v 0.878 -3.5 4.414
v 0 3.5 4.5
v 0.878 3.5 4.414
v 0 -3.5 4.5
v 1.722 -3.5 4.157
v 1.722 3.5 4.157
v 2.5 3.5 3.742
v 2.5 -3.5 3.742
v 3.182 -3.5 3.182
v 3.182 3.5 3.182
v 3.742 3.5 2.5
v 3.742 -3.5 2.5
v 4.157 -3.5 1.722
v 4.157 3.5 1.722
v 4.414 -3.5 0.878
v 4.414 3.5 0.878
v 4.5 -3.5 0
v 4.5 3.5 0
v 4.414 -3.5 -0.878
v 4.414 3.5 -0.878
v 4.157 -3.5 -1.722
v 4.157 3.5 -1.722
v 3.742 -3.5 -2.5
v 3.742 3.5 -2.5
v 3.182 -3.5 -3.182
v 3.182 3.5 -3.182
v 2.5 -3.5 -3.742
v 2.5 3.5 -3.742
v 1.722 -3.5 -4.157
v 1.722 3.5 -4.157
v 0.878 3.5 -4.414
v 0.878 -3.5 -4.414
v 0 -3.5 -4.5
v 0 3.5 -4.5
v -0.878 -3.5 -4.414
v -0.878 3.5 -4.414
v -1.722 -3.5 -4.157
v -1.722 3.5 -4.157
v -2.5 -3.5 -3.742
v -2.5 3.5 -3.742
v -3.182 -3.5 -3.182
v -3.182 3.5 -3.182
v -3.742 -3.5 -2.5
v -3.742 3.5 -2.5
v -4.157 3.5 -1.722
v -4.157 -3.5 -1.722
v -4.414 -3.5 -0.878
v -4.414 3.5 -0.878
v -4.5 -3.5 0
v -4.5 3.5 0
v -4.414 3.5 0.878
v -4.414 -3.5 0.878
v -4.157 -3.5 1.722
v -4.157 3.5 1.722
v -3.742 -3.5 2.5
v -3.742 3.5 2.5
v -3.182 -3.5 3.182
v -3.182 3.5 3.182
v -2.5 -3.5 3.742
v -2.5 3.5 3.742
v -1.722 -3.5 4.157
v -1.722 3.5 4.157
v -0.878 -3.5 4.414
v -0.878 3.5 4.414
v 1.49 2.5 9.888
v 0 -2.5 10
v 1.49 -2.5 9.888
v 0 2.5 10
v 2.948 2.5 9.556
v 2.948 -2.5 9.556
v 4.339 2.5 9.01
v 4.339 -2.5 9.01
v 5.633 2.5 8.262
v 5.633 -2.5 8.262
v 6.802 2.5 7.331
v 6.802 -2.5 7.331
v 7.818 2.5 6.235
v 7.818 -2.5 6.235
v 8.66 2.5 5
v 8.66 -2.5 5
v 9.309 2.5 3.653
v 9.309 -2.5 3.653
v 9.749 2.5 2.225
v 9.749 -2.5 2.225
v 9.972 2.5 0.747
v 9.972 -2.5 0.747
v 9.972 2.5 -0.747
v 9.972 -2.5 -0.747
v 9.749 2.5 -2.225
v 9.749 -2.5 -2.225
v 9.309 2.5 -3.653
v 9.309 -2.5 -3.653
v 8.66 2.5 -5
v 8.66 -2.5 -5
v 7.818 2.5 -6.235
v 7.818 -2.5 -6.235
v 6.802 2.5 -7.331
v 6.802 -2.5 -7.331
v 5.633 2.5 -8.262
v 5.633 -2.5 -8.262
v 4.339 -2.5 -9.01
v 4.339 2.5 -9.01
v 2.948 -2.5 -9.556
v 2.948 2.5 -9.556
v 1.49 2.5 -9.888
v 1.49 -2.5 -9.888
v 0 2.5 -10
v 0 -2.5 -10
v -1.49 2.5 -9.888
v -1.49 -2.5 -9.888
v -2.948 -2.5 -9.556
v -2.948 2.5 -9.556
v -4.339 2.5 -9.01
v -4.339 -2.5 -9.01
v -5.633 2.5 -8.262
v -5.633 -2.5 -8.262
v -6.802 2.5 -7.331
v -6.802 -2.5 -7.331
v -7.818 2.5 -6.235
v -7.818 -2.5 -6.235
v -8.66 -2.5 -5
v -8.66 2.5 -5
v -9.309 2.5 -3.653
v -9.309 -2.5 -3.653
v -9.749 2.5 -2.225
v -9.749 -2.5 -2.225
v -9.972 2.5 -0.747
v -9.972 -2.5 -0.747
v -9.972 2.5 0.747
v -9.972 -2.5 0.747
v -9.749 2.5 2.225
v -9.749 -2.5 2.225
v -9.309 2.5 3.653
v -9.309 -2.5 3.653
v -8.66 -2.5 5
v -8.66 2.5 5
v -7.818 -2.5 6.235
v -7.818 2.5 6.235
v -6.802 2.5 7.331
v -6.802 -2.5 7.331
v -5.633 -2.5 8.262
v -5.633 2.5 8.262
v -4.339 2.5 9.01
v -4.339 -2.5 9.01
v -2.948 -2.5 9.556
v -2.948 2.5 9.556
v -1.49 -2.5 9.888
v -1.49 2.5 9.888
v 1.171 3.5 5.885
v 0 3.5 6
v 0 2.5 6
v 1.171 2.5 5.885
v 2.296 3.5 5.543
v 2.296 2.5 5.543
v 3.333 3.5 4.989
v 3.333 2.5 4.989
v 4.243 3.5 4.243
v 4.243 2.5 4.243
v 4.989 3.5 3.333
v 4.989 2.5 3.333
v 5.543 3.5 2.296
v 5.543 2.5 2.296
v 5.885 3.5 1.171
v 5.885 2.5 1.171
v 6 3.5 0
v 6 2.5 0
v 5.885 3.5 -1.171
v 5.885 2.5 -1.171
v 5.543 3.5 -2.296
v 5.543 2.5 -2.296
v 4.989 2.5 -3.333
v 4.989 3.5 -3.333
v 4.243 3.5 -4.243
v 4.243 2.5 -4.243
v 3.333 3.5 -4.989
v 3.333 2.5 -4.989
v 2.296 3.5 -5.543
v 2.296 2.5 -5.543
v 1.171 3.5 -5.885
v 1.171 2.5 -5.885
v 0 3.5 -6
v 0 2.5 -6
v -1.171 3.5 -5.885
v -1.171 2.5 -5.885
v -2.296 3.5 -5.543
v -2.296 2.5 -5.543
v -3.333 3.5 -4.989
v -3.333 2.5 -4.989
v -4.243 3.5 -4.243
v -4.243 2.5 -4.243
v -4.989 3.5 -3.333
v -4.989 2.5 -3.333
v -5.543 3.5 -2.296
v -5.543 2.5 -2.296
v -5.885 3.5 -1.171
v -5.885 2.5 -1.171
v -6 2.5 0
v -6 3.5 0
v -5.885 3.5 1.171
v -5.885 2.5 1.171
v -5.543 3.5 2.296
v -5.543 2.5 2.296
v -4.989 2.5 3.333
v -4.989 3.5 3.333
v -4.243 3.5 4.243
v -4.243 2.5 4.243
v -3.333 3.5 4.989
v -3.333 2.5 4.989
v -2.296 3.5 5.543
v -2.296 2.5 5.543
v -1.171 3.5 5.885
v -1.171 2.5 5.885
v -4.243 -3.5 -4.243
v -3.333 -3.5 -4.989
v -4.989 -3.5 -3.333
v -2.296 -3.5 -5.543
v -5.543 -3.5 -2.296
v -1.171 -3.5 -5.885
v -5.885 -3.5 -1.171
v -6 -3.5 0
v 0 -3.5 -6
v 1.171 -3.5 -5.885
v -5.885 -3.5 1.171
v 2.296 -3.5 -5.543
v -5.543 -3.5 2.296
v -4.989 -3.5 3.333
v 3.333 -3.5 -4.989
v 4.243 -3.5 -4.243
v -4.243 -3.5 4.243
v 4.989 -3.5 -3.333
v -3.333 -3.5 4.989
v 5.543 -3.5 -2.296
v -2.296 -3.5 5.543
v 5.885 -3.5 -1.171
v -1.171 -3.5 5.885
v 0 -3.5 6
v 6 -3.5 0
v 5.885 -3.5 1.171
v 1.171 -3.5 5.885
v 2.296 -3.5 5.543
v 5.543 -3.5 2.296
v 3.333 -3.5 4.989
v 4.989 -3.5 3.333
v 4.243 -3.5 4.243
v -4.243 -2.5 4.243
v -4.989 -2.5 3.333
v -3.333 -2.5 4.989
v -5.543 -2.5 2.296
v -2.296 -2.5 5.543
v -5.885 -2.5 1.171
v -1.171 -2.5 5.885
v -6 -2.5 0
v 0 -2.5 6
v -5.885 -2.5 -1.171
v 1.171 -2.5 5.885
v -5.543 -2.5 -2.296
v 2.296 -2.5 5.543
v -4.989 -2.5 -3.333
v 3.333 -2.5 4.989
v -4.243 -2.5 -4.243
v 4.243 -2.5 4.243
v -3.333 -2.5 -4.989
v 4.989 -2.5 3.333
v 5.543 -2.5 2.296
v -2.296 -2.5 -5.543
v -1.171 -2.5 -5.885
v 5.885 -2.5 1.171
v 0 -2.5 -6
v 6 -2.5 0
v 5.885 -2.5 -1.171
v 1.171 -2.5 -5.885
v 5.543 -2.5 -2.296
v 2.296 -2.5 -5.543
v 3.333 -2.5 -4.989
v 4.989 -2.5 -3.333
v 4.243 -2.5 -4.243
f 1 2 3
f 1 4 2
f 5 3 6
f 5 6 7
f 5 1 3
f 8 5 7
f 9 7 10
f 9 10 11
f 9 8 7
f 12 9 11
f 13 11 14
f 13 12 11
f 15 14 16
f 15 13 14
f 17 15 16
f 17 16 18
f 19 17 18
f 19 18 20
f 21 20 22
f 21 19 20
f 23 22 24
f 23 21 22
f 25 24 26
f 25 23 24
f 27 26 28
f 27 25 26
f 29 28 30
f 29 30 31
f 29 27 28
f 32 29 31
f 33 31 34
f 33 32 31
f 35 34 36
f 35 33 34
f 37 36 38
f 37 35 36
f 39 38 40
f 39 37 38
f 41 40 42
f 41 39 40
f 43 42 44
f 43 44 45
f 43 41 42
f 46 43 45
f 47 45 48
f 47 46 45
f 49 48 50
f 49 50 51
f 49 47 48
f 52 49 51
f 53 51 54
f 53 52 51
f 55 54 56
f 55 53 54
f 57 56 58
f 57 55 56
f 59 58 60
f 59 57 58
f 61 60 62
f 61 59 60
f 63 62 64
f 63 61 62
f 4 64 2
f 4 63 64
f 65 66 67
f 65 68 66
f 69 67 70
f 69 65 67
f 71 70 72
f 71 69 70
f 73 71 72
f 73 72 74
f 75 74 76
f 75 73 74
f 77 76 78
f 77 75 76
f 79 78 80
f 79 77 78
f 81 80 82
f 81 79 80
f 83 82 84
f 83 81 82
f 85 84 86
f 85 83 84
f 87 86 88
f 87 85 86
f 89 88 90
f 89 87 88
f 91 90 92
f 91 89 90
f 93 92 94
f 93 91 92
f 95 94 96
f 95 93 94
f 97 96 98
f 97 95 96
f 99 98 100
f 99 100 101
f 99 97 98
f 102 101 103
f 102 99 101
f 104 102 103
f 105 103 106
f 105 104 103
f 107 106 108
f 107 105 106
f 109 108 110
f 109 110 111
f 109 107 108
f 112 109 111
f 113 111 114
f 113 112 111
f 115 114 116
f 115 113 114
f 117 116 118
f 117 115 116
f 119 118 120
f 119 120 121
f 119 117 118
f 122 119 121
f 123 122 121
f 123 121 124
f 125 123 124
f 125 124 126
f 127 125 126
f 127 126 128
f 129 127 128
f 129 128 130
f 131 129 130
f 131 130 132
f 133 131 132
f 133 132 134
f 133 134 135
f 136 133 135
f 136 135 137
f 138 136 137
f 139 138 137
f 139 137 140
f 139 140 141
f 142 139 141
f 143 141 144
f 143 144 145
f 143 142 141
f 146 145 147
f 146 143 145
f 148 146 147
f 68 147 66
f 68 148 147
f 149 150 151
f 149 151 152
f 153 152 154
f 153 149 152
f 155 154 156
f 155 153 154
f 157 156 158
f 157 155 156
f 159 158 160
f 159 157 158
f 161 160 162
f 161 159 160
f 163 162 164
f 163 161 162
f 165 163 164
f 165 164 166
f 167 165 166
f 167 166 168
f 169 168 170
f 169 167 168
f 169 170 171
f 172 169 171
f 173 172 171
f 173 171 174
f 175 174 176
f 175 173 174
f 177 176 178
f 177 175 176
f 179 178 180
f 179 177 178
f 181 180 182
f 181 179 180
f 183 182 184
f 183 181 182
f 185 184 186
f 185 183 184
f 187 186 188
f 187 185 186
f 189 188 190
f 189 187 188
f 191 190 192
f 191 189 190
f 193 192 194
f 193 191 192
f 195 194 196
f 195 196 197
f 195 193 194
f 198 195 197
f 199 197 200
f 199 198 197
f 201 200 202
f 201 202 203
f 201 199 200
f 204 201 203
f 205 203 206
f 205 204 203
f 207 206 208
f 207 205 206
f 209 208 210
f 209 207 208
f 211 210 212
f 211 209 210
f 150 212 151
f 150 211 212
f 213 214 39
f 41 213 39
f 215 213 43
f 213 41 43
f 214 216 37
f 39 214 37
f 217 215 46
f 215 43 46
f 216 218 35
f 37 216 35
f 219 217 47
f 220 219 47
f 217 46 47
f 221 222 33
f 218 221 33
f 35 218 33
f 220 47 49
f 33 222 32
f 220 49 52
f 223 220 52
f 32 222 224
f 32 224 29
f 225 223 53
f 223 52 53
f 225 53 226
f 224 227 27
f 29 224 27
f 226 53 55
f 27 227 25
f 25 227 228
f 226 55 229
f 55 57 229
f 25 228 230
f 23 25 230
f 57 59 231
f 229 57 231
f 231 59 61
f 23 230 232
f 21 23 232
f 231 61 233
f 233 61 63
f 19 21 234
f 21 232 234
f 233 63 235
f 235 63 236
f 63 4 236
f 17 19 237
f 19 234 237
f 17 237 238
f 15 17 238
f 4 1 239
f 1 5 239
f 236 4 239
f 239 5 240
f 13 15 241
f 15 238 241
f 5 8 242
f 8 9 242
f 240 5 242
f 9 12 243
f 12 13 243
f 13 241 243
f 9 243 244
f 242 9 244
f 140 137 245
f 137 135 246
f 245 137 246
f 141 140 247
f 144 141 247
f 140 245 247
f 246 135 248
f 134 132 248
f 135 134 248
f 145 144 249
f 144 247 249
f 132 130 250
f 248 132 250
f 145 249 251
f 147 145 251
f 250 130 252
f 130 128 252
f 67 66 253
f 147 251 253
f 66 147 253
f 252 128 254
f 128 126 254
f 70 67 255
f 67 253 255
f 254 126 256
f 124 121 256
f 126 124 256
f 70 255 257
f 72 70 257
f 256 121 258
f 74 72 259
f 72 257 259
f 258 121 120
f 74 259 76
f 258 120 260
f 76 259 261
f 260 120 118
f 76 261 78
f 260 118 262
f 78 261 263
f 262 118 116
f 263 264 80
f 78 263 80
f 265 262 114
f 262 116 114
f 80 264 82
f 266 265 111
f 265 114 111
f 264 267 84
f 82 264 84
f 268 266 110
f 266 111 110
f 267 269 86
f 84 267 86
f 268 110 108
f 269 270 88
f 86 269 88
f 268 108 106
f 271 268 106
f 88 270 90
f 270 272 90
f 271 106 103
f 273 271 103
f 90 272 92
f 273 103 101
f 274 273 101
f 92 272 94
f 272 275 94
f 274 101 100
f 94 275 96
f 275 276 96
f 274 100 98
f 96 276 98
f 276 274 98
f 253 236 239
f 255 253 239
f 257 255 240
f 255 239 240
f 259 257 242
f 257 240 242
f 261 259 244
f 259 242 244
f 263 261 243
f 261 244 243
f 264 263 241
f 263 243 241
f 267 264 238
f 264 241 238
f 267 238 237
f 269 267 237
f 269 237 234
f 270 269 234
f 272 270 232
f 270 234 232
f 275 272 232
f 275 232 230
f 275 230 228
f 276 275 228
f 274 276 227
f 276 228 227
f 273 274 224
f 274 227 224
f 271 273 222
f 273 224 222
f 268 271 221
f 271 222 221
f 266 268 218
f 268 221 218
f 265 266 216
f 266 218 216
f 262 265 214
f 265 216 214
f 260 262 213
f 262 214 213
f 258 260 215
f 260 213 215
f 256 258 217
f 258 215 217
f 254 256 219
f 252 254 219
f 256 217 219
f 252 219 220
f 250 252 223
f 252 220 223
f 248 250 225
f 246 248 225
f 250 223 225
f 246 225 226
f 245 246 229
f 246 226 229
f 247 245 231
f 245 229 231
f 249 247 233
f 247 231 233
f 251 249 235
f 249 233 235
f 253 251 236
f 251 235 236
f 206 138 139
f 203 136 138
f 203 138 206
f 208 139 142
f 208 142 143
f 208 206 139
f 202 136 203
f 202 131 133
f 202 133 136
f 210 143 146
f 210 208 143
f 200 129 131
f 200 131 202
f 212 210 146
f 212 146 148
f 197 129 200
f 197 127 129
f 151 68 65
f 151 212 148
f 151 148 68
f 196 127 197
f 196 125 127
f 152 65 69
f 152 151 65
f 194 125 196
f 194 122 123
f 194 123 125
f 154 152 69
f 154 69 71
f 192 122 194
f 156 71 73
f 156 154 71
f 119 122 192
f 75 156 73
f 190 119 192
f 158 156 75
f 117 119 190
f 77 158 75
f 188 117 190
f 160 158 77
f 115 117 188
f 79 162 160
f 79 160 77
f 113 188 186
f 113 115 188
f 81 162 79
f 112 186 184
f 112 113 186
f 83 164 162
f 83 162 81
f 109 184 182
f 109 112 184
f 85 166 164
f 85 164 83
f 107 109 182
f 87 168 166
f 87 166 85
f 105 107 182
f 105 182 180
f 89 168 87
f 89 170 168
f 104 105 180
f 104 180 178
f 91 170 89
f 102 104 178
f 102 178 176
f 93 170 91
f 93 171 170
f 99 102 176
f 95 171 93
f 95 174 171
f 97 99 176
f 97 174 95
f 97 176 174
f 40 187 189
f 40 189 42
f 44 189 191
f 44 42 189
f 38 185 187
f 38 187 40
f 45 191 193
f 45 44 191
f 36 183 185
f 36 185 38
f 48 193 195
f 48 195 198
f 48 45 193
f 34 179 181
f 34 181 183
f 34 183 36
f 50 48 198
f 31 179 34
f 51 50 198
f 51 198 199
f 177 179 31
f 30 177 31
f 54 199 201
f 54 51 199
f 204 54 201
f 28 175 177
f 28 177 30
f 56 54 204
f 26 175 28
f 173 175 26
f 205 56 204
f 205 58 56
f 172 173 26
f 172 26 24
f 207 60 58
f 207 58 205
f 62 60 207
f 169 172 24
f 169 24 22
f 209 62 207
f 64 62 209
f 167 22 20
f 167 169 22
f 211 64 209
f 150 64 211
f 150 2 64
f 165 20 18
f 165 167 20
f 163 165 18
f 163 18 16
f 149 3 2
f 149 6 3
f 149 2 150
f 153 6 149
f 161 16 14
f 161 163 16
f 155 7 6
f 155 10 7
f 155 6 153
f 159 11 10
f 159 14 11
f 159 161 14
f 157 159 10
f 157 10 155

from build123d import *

# Parameters (mm, degrees)
SKETCH1_R           = 10
SKETCH1_R_2         = 4.5
BOSS_EXTRUDE1_DEPTH = 3.5
SKETCH2_R           = 13
SKETCH2_R_2         = 6
CUT_EXTRUDE1_DEPTH  = 1


with BuildPart() as part:
    # Sketch1 → Boss-Extrude1 (new, symmetric)
    with BuildSketch(Plane(origin=(0, 0, 0), x_dir=(1, 0, 0), z_dir=(0, 1, 0))):
        with Locations(Location((0, 0, 0), (0, 0, 270))):
            Circle(SKETCH1_R)
        with Locations(Location((0, 0, 0), (0, 0, 270))):
            Circle(SKETCH1_R_2, mode=Mode.SUBTRACT)
    extrude(amount=BOSS_EXTRUDE1_DEPTH, both=True)

    # Sketch2 → Cut-Extrude1 (cut)
    with BuildSketch(Plane(origin=(0, 3.5, 0), x_dir=(1, 0, 0), z_dir=(0, 1, 0))):
        Circle(SKETCH2_R)
        with Locations(Location((0, 0, 0), (0, 0, 270))):
            Circle(SKETCH2_R_2, mode=Mode.SUBTRACT)
    cut_extrude1 = extrude(amount=-CUT_EXTRUDE1_DEPTH, mode=Mode.SUBTRACT)

    # Mirror1: Cut-Extrude1 across plane
    add(cut_extrude1.mirror(Plane.ZX), mode=Mode.SUBTRACT)


solid = part.part
